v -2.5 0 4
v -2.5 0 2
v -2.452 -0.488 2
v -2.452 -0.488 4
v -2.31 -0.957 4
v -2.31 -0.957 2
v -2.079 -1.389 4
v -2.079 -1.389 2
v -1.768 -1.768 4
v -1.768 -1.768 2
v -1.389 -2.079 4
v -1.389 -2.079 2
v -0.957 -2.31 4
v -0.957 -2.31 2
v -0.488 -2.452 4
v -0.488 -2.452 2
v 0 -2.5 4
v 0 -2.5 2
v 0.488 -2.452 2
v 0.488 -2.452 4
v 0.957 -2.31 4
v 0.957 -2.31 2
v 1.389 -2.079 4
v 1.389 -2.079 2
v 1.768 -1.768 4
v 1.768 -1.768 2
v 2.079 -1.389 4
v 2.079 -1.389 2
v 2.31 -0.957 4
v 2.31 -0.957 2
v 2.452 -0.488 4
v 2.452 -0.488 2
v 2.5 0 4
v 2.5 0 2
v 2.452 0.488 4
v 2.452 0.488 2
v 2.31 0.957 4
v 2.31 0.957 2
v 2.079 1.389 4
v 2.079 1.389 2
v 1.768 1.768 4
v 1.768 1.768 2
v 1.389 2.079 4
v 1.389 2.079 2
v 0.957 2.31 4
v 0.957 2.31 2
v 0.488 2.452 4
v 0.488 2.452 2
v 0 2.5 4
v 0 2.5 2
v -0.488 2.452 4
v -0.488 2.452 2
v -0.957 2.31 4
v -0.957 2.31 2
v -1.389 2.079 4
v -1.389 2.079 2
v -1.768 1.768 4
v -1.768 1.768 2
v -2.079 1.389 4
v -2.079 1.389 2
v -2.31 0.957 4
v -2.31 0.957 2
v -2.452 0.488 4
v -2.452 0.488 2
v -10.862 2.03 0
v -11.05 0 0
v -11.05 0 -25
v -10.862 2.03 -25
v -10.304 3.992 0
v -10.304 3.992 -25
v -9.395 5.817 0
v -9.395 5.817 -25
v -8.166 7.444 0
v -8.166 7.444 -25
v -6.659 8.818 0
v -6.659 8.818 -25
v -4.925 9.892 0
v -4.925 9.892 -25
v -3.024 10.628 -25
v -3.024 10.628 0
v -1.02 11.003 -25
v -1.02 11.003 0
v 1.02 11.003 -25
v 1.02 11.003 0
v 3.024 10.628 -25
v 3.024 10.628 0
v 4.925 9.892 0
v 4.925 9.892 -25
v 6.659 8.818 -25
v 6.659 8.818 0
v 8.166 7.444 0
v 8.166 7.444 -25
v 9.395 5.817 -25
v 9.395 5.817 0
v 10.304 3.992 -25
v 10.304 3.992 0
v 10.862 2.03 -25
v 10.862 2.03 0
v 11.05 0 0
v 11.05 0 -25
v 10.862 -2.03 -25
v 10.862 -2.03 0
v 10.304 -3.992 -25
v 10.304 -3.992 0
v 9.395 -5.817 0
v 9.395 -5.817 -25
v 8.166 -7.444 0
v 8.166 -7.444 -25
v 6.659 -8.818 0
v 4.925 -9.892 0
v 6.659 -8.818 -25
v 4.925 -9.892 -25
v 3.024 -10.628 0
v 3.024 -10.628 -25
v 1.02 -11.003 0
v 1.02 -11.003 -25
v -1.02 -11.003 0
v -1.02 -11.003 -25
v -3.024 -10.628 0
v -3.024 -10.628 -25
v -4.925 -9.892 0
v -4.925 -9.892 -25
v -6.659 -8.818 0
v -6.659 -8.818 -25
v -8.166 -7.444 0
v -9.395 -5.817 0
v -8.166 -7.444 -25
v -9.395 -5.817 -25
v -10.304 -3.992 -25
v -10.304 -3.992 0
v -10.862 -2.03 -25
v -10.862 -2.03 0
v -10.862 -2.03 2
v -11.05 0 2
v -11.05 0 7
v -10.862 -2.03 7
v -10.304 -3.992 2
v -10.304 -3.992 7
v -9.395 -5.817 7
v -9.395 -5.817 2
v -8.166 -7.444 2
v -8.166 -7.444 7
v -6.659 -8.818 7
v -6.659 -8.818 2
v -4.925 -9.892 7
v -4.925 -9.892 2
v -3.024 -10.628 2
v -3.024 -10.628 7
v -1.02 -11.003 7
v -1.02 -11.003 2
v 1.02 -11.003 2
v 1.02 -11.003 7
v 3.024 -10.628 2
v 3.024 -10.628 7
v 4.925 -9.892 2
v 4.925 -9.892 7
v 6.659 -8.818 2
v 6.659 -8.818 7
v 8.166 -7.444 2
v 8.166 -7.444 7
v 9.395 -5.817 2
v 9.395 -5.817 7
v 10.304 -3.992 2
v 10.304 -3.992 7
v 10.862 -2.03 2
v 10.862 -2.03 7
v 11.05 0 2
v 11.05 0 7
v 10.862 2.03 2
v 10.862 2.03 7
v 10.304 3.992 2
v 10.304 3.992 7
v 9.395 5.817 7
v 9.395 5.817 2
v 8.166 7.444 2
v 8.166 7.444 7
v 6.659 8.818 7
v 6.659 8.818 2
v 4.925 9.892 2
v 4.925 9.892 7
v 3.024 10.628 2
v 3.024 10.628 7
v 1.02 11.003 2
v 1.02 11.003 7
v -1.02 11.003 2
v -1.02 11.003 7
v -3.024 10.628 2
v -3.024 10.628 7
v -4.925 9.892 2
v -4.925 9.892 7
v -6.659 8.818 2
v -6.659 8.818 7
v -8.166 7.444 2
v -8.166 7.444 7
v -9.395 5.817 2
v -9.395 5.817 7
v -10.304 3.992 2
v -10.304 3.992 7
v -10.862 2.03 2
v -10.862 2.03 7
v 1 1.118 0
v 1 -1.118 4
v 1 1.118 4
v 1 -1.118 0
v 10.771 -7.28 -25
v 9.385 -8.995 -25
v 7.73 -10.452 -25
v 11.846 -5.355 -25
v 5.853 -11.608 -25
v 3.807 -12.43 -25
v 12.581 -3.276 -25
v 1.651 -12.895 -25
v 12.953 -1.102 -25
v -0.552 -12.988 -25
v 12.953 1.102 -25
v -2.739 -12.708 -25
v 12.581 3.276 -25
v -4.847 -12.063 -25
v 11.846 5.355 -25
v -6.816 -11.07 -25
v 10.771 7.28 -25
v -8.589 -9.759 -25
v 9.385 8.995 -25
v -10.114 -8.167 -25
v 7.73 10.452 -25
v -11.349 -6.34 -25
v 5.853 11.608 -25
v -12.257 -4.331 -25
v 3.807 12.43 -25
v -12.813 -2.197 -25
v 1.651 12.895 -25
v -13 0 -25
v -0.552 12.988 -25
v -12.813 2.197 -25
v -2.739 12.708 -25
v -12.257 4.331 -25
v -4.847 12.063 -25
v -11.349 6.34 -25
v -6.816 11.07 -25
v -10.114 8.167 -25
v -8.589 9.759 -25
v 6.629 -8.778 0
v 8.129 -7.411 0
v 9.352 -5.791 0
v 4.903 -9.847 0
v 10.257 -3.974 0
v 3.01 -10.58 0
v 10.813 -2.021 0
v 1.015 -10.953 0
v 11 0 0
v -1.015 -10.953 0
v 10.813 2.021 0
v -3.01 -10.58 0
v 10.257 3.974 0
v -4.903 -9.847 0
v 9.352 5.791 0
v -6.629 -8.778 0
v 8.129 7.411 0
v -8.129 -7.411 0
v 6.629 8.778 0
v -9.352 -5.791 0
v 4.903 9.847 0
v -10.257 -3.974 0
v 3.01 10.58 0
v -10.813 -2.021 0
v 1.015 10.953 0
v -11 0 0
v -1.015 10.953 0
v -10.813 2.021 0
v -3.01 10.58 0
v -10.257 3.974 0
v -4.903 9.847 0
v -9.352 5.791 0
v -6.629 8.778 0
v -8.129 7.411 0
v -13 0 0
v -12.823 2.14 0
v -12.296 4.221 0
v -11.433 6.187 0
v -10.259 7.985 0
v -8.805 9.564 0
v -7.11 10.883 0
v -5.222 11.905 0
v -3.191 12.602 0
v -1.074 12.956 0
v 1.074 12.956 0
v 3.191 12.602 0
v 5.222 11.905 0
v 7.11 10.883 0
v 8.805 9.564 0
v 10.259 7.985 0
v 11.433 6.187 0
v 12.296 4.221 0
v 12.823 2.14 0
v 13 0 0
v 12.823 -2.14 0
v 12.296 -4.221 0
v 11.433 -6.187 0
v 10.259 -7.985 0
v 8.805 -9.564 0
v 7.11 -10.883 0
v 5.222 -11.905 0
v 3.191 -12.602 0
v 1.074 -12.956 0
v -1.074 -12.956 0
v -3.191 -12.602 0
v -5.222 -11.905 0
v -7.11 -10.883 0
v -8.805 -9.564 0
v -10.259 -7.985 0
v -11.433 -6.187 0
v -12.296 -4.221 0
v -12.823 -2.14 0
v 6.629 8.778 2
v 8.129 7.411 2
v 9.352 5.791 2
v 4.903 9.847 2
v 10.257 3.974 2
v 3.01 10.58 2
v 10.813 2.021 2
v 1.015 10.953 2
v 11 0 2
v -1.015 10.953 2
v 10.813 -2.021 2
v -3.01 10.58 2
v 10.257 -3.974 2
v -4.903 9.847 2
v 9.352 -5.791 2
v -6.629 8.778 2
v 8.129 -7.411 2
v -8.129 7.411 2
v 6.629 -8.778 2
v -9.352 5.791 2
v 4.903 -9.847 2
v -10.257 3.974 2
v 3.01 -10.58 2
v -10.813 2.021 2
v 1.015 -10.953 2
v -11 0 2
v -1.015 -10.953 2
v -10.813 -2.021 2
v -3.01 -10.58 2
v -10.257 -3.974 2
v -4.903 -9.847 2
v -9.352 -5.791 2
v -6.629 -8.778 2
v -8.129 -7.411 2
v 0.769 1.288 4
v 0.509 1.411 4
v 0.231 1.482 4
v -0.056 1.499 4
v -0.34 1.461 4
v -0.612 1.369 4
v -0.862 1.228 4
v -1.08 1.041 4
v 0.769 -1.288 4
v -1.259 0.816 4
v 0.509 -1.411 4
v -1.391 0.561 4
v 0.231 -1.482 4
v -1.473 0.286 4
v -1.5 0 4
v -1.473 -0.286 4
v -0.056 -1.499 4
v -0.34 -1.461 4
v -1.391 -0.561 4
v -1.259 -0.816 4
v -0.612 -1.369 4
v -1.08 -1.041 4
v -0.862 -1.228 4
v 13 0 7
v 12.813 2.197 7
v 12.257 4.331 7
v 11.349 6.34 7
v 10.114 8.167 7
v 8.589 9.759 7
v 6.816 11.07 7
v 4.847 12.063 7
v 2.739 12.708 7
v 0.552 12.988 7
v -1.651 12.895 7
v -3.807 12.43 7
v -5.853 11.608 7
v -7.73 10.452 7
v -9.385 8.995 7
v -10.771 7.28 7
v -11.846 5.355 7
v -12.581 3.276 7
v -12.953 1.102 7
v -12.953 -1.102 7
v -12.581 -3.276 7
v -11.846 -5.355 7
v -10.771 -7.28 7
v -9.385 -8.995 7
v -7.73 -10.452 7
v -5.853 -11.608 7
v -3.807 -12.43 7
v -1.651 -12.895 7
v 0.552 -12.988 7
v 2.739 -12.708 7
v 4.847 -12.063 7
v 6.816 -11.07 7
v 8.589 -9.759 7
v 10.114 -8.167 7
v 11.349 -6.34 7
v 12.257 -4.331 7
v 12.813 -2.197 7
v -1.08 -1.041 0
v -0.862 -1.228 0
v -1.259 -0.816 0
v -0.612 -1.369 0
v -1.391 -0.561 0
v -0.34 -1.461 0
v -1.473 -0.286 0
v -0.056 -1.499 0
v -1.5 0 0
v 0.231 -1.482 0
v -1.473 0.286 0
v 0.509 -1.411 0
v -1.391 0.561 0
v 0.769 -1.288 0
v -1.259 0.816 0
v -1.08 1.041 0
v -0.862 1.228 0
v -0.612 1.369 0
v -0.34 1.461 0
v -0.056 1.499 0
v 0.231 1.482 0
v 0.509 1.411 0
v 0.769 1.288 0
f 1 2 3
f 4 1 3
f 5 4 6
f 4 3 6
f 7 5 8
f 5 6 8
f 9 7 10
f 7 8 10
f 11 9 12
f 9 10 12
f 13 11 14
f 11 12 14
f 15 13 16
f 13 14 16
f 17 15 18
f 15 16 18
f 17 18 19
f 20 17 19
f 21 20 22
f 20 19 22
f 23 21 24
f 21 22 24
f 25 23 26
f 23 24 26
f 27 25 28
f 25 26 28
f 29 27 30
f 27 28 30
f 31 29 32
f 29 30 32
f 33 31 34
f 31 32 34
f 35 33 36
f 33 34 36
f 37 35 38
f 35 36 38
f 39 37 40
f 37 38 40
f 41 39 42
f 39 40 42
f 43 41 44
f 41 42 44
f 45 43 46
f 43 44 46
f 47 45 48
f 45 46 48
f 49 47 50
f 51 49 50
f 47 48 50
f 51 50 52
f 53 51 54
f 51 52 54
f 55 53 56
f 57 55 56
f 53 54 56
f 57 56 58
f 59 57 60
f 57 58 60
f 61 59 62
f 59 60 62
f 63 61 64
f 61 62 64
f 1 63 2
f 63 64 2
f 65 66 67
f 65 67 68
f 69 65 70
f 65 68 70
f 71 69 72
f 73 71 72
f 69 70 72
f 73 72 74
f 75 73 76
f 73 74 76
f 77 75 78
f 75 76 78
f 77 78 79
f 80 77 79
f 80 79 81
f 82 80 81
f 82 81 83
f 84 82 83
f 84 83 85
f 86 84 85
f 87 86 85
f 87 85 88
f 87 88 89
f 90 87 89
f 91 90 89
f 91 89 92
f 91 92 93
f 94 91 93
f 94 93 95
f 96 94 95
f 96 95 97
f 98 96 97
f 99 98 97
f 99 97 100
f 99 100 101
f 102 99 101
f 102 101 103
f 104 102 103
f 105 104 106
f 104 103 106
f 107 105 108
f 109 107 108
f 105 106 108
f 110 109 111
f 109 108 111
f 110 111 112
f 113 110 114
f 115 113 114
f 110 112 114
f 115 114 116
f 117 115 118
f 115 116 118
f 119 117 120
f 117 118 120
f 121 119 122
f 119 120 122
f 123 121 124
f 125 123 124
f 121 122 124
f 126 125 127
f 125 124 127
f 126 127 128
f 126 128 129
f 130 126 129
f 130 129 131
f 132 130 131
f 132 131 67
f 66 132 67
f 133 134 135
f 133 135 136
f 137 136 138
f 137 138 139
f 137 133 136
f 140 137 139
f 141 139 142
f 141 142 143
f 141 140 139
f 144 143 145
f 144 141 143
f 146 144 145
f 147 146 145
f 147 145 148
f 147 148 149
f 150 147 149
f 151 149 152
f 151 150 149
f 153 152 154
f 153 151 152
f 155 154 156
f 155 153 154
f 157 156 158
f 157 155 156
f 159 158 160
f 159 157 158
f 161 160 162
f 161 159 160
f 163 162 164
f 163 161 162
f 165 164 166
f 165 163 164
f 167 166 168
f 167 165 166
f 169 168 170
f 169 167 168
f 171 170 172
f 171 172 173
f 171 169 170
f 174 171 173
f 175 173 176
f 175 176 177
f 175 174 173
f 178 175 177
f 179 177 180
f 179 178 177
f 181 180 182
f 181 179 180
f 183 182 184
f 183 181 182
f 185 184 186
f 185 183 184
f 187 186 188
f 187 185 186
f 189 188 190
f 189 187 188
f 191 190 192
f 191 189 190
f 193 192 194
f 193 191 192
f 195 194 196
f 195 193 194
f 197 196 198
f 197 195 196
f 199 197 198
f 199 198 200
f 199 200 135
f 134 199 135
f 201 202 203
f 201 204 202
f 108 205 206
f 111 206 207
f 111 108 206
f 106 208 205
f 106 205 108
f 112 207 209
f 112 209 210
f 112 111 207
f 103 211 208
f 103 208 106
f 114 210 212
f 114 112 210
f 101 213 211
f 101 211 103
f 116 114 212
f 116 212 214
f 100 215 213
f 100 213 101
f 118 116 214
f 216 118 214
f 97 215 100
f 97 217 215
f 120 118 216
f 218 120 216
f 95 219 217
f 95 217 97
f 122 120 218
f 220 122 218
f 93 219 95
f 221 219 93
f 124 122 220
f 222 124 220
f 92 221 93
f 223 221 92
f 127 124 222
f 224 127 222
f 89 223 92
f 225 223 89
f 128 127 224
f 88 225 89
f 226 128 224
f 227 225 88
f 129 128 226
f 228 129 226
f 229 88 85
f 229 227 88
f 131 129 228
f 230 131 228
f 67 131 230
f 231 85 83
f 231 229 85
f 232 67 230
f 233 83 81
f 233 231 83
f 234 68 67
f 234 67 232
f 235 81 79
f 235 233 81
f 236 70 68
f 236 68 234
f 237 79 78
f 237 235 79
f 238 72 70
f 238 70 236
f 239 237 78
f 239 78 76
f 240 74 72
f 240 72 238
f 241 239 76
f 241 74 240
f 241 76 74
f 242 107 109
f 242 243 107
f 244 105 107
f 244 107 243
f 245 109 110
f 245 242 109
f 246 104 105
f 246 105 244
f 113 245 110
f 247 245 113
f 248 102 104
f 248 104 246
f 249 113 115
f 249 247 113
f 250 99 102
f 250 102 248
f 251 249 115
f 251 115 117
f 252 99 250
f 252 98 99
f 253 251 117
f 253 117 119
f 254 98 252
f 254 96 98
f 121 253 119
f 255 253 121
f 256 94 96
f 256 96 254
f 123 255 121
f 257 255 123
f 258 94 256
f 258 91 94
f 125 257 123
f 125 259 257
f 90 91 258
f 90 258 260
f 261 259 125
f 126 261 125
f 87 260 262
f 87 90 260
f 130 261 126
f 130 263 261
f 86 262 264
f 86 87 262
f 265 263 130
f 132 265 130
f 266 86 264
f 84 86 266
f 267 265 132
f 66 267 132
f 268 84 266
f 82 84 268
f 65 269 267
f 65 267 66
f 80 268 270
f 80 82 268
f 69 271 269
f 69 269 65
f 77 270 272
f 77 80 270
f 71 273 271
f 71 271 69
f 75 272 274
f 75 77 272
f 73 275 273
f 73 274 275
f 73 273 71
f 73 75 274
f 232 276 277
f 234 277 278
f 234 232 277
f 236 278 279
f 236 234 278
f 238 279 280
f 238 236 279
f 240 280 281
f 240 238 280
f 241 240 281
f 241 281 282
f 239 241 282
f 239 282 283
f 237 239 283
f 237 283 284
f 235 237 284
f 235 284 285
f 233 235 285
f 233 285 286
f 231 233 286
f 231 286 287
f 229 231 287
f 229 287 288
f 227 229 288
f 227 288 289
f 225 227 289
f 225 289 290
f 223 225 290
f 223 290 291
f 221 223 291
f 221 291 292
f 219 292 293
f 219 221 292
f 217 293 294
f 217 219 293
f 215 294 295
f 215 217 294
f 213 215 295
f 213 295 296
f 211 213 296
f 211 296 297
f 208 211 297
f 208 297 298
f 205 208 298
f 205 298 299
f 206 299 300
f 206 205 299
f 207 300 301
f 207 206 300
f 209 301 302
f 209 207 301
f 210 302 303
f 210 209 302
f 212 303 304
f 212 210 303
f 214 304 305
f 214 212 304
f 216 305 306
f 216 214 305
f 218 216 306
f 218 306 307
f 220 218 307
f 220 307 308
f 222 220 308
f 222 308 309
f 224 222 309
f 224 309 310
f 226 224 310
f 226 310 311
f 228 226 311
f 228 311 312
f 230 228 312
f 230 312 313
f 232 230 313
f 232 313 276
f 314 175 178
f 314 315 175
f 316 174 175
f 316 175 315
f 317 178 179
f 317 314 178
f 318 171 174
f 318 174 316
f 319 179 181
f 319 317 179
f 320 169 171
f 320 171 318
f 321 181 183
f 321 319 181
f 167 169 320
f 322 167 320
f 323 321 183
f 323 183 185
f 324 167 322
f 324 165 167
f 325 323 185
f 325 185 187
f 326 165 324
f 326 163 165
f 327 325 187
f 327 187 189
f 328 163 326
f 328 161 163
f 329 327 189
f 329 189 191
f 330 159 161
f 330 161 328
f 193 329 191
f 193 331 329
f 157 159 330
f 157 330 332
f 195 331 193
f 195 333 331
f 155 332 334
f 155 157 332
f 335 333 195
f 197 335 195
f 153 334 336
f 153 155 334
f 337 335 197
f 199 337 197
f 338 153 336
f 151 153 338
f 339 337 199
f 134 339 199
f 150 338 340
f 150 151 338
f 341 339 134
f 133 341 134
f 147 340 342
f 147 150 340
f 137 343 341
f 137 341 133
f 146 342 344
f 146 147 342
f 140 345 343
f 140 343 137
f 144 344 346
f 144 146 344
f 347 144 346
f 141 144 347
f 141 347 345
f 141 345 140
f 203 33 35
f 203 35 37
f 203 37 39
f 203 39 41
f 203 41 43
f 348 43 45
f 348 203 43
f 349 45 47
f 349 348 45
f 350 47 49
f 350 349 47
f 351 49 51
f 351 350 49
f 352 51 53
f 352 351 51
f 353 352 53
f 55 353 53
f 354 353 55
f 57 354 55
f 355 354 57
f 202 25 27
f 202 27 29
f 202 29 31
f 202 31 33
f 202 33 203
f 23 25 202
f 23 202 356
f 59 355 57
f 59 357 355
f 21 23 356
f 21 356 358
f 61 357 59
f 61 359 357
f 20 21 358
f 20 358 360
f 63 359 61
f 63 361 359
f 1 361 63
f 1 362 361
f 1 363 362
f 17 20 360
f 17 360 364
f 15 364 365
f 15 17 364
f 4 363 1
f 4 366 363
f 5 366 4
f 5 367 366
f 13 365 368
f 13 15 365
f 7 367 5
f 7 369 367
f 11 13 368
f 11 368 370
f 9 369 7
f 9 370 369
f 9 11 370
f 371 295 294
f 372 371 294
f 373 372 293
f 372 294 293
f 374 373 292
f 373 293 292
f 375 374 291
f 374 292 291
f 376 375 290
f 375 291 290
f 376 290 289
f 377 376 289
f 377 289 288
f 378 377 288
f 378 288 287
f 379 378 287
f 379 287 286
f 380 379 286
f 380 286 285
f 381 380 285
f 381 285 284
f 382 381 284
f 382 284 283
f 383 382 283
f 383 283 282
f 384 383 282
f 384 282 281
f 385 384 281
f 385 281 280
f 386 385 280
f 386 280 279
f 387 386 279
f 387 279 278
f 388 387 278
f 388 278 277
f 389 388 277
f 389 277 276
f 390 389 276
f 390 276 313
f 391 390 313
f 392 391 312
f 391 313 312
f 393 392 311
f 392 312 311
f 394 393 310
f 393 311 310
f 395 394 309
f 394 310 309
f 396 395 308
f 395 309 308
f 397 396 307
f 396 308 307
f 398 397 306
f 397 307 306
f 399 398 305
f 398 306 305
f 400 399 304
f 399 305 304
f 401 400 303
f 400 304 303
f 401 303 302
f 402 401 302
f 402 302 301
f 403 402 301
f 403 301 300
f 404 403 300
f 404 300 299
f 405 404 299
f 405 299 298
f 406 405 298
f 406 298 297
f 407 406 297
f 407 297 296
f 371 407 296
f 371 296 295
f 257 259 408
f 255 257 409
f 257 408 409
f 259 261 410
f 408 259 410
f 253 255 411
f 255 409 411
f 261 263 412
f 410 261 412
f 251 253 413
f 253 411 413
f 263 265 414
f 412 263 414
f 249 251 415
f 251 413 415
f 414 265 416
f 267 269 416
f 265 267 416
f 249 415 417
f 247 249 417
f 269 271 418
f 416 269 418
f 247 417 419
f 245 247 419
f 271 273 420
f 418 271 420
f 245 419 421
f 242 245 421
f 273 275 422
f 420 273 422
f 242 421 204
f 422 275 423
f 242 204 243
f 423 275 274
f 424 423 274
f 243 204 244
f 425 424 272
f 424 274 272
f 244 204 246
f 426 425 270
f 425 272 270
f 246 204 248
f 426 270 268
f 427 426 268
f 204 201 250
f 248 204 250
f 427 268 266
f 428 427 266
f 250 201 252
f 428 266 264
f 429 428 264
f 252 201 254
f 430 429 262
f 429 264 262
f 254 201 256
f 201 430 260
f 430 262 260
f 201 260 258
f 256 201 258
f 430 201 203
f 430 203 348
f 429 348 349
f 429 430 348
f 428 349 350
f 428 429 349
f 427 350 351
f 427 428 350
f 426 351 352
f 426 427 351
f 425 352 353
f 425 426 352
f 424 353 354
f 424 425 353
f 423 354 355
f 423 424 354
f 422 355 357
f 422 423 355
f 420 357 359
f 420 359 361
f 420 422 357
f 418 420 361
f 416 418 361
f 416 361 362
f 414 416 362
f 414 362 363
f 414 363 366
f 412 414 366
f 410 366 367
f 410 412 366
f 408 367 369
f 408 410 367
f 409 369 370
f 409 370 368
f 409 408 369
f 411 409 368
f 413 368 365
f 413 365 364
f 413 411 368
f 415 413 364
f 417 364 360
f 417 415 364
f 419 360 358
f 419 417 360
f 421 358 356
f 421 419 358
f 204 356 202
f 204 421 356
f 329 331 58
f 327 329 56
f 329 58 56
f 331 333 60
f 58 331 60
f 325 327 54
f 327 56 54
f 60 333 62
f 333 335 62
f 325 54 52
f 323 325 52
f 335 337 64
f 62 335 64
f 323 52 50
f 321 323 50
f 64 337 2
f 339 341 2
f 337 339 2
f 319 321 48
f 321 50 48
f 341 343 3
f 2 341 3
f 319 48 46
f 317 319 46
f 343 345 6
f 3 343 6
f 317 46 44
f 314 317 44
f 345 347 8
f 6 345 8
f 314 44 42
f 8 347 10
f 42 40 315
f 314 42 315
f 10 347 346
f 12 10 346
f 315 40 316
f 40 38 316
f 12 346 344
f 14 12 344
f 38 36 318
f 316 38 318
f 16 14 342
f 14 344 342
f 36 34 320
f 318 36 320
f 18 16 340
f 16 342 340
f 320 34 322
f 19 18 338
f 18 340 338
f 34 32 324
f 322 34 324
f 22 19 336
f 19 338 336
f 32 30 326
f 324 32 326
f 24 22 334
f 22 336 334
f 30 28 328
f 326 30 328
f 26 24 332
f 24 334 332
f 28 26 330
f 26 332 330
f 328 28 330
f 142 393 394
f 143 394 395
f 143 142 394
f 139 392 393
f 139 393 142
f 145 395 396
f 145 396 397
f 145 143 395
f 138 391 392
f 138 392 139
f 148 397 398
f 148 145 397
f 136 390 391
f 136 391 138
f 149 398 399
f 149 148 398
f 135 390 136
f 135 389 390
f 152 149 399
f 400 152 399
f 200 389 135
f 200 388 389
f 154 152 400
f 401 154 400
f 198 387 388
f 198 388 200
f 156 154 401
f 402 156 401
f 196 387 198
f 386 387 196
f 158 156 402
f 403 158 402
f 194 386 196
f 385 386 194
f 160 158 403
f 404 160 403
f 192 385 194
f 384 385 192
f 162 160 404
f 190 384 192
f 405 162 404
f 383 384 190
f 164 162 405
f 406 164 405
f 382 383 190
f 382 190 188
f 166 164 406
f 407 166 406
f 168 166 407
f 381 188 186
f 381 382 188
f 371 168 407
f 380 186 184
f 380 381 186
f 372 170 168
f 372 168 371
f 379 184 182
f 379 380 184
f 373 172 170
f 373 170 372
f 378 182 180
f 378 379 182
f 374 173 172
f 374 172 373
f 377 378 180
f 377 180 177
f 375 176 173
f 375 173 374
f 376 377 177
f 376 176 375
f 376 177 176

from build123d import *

# Parameters (mm, degrees)
SKETCH_1_R          = 13
SKETCH_1_R_2        = 11
EXTRUDE_1_DEPTH     = 7
SKETCH_3_R          = 13
EXTRUDE_2_DEPTH     = 2
CUT_EXTRUDE_1_REACH = 21.672
SKETCH_7_R          = 2.5
EXTRUDE_3_DEPTH     = 2
EXTRUDE_START       = 27
SKETCH_8_R          = 13
SKETCH_8_R_2        = 11
EXTRUDE_4_DEPTH     = 27
SKETCH_10_R         = 11.05
CUT_EXTRUDE_2_DEPTH = 27
CUT_EXTRUDE_START   = -5
SKETCH_11_R         = 11.05
SKETCH_11_R_2       = 2.5
CUT_EXTRUDE_3_DEPTH = 5
SKETCH_12_R         = 14.847927408
CUT_EXTRUDE_4_DEPTH = 2


with BuildPart() as part:
    # 草图1 → 凸台-拉伸1 (new body)
    with BuildSketch(Plane.XY):
        Circle(SKETCH_1_R)
        Circle(SKETCH_1_R_2, mode=Mode.SUBTRACT)
    extrude(amount=EXTRUDE_1_DEPTH)

    # 草图3 → 凸台-拉伸2 (add)
    with BuildSketch(Plane(origin=(0, 0, 0), x_dir=(-1, 0, 0), z_dir=(0, 0, -1))):
        with Locations(Location((0, 0, 0), (0, 0, 180))):
            Circle(SKETCH_3_R)
    extrude(amount=-EXTRUDE_2_DEPTH)

    # 草图6 → 切除-拉伸1 (cut, up to next)
    with BuildSketch(Plane(origin=(0, 0, 0), x_dir=(-1, 0, 0), z_dir=(0, 0, -1)), mode=Mode.PRIVATE) as cut_extrude_1_sk1:
        with BuildLine():
            Line((-1, -1.118033989), (-1, 1.118033989))
            ThreePointArc((-1, 1.118033989), (1.5, 0), (-1, -1.118033989))
        make_face()
    cut_extrude_1_tool1 = extrude(cut_extrude_1_sk1.sketch, amount=-CUT_EXTRUDE_1_REACH, mode=Mode.PRIVATE) & part.part
    add(cut_extrude_1_tool1.solids().sort_by_distance((-0.148024, 0, 0))[0], mode=Mode.SUBTRACT)

    # 草图7 → 凸台-拉伸3 (add)
    with BuildSketch(Plane.XY.offset(2)):
        with Locations(Location((0, 0, 0), (0, 0, 180))):
            Circle(SKETCH_7_R)
        with BuildLine():
            Line((1, -1.118033989), (1, 1.118033989))
            ThreePointArc((1, 1.118033989), (-1.5, 0), (1, -1.118033989))
        make_face(mode=Mode.SUBTRACT)
    extrude(amount=EXTRUDE_3_DEPTH)

    # 草图8 → 凸台-拉伸4 (add)
    with BuildSketch(Plane(origin=(0, 0, 0), x_dir=(-1, 0, 0), z_dir=(0, 0, -1)).offset(EXTRUDE_START)):
        Circle(SKETCH_8_R)
        Circle(SKETCH_8_R_2, mode=Mode.SUBTRACT)
    extrude(amount=-EXTRUDE_4_DEPTH)

    # 草图10 → 切除-拉伸2 (cut)
    with BuildSketch(Plane(origin=(0, 0, -27), x_dir=(-1, 0, 0), z_dir=(0, 0, -1))):
        Circle(SKETCH_10_R)
    extrude(amount=-CUT_EXTRUDE_2_DEPTH, mode=Mode.SUBTRACT)

    # 草图11 → 切除-拉伸3 (cut)
    with BuildSketch(Plane.XY.offset(7).offset(CUT_EXTRUDE_START)):
        with Locations(Location((0, 0, 0), (0, 0, 180))):
            Circle(SKETCH_11_R)
        with Locations(Location((0, 0, 0), (0, 0, 180))):
            Circle(SKETCH_11_R_2, mode=Mode.SUBTRACT)
    extrude(amount=CUT_EXTRUDE_3_DEPTH, mode=Mode.SUBTRACT)

    # 草图12 → 切除-拉伸4 (cut)
    with BuildSketch(Plane(origin=(0, 0, -27), x_dir=(-1, 0, 0), z_dir=(0, 0, -1))):
        Circle(SKETCH_12_R)
    extrude(amount=-CUT_EXTRUDE_4_DEPTH, mode=Mode.SUBTRACT)


solid = part.part
